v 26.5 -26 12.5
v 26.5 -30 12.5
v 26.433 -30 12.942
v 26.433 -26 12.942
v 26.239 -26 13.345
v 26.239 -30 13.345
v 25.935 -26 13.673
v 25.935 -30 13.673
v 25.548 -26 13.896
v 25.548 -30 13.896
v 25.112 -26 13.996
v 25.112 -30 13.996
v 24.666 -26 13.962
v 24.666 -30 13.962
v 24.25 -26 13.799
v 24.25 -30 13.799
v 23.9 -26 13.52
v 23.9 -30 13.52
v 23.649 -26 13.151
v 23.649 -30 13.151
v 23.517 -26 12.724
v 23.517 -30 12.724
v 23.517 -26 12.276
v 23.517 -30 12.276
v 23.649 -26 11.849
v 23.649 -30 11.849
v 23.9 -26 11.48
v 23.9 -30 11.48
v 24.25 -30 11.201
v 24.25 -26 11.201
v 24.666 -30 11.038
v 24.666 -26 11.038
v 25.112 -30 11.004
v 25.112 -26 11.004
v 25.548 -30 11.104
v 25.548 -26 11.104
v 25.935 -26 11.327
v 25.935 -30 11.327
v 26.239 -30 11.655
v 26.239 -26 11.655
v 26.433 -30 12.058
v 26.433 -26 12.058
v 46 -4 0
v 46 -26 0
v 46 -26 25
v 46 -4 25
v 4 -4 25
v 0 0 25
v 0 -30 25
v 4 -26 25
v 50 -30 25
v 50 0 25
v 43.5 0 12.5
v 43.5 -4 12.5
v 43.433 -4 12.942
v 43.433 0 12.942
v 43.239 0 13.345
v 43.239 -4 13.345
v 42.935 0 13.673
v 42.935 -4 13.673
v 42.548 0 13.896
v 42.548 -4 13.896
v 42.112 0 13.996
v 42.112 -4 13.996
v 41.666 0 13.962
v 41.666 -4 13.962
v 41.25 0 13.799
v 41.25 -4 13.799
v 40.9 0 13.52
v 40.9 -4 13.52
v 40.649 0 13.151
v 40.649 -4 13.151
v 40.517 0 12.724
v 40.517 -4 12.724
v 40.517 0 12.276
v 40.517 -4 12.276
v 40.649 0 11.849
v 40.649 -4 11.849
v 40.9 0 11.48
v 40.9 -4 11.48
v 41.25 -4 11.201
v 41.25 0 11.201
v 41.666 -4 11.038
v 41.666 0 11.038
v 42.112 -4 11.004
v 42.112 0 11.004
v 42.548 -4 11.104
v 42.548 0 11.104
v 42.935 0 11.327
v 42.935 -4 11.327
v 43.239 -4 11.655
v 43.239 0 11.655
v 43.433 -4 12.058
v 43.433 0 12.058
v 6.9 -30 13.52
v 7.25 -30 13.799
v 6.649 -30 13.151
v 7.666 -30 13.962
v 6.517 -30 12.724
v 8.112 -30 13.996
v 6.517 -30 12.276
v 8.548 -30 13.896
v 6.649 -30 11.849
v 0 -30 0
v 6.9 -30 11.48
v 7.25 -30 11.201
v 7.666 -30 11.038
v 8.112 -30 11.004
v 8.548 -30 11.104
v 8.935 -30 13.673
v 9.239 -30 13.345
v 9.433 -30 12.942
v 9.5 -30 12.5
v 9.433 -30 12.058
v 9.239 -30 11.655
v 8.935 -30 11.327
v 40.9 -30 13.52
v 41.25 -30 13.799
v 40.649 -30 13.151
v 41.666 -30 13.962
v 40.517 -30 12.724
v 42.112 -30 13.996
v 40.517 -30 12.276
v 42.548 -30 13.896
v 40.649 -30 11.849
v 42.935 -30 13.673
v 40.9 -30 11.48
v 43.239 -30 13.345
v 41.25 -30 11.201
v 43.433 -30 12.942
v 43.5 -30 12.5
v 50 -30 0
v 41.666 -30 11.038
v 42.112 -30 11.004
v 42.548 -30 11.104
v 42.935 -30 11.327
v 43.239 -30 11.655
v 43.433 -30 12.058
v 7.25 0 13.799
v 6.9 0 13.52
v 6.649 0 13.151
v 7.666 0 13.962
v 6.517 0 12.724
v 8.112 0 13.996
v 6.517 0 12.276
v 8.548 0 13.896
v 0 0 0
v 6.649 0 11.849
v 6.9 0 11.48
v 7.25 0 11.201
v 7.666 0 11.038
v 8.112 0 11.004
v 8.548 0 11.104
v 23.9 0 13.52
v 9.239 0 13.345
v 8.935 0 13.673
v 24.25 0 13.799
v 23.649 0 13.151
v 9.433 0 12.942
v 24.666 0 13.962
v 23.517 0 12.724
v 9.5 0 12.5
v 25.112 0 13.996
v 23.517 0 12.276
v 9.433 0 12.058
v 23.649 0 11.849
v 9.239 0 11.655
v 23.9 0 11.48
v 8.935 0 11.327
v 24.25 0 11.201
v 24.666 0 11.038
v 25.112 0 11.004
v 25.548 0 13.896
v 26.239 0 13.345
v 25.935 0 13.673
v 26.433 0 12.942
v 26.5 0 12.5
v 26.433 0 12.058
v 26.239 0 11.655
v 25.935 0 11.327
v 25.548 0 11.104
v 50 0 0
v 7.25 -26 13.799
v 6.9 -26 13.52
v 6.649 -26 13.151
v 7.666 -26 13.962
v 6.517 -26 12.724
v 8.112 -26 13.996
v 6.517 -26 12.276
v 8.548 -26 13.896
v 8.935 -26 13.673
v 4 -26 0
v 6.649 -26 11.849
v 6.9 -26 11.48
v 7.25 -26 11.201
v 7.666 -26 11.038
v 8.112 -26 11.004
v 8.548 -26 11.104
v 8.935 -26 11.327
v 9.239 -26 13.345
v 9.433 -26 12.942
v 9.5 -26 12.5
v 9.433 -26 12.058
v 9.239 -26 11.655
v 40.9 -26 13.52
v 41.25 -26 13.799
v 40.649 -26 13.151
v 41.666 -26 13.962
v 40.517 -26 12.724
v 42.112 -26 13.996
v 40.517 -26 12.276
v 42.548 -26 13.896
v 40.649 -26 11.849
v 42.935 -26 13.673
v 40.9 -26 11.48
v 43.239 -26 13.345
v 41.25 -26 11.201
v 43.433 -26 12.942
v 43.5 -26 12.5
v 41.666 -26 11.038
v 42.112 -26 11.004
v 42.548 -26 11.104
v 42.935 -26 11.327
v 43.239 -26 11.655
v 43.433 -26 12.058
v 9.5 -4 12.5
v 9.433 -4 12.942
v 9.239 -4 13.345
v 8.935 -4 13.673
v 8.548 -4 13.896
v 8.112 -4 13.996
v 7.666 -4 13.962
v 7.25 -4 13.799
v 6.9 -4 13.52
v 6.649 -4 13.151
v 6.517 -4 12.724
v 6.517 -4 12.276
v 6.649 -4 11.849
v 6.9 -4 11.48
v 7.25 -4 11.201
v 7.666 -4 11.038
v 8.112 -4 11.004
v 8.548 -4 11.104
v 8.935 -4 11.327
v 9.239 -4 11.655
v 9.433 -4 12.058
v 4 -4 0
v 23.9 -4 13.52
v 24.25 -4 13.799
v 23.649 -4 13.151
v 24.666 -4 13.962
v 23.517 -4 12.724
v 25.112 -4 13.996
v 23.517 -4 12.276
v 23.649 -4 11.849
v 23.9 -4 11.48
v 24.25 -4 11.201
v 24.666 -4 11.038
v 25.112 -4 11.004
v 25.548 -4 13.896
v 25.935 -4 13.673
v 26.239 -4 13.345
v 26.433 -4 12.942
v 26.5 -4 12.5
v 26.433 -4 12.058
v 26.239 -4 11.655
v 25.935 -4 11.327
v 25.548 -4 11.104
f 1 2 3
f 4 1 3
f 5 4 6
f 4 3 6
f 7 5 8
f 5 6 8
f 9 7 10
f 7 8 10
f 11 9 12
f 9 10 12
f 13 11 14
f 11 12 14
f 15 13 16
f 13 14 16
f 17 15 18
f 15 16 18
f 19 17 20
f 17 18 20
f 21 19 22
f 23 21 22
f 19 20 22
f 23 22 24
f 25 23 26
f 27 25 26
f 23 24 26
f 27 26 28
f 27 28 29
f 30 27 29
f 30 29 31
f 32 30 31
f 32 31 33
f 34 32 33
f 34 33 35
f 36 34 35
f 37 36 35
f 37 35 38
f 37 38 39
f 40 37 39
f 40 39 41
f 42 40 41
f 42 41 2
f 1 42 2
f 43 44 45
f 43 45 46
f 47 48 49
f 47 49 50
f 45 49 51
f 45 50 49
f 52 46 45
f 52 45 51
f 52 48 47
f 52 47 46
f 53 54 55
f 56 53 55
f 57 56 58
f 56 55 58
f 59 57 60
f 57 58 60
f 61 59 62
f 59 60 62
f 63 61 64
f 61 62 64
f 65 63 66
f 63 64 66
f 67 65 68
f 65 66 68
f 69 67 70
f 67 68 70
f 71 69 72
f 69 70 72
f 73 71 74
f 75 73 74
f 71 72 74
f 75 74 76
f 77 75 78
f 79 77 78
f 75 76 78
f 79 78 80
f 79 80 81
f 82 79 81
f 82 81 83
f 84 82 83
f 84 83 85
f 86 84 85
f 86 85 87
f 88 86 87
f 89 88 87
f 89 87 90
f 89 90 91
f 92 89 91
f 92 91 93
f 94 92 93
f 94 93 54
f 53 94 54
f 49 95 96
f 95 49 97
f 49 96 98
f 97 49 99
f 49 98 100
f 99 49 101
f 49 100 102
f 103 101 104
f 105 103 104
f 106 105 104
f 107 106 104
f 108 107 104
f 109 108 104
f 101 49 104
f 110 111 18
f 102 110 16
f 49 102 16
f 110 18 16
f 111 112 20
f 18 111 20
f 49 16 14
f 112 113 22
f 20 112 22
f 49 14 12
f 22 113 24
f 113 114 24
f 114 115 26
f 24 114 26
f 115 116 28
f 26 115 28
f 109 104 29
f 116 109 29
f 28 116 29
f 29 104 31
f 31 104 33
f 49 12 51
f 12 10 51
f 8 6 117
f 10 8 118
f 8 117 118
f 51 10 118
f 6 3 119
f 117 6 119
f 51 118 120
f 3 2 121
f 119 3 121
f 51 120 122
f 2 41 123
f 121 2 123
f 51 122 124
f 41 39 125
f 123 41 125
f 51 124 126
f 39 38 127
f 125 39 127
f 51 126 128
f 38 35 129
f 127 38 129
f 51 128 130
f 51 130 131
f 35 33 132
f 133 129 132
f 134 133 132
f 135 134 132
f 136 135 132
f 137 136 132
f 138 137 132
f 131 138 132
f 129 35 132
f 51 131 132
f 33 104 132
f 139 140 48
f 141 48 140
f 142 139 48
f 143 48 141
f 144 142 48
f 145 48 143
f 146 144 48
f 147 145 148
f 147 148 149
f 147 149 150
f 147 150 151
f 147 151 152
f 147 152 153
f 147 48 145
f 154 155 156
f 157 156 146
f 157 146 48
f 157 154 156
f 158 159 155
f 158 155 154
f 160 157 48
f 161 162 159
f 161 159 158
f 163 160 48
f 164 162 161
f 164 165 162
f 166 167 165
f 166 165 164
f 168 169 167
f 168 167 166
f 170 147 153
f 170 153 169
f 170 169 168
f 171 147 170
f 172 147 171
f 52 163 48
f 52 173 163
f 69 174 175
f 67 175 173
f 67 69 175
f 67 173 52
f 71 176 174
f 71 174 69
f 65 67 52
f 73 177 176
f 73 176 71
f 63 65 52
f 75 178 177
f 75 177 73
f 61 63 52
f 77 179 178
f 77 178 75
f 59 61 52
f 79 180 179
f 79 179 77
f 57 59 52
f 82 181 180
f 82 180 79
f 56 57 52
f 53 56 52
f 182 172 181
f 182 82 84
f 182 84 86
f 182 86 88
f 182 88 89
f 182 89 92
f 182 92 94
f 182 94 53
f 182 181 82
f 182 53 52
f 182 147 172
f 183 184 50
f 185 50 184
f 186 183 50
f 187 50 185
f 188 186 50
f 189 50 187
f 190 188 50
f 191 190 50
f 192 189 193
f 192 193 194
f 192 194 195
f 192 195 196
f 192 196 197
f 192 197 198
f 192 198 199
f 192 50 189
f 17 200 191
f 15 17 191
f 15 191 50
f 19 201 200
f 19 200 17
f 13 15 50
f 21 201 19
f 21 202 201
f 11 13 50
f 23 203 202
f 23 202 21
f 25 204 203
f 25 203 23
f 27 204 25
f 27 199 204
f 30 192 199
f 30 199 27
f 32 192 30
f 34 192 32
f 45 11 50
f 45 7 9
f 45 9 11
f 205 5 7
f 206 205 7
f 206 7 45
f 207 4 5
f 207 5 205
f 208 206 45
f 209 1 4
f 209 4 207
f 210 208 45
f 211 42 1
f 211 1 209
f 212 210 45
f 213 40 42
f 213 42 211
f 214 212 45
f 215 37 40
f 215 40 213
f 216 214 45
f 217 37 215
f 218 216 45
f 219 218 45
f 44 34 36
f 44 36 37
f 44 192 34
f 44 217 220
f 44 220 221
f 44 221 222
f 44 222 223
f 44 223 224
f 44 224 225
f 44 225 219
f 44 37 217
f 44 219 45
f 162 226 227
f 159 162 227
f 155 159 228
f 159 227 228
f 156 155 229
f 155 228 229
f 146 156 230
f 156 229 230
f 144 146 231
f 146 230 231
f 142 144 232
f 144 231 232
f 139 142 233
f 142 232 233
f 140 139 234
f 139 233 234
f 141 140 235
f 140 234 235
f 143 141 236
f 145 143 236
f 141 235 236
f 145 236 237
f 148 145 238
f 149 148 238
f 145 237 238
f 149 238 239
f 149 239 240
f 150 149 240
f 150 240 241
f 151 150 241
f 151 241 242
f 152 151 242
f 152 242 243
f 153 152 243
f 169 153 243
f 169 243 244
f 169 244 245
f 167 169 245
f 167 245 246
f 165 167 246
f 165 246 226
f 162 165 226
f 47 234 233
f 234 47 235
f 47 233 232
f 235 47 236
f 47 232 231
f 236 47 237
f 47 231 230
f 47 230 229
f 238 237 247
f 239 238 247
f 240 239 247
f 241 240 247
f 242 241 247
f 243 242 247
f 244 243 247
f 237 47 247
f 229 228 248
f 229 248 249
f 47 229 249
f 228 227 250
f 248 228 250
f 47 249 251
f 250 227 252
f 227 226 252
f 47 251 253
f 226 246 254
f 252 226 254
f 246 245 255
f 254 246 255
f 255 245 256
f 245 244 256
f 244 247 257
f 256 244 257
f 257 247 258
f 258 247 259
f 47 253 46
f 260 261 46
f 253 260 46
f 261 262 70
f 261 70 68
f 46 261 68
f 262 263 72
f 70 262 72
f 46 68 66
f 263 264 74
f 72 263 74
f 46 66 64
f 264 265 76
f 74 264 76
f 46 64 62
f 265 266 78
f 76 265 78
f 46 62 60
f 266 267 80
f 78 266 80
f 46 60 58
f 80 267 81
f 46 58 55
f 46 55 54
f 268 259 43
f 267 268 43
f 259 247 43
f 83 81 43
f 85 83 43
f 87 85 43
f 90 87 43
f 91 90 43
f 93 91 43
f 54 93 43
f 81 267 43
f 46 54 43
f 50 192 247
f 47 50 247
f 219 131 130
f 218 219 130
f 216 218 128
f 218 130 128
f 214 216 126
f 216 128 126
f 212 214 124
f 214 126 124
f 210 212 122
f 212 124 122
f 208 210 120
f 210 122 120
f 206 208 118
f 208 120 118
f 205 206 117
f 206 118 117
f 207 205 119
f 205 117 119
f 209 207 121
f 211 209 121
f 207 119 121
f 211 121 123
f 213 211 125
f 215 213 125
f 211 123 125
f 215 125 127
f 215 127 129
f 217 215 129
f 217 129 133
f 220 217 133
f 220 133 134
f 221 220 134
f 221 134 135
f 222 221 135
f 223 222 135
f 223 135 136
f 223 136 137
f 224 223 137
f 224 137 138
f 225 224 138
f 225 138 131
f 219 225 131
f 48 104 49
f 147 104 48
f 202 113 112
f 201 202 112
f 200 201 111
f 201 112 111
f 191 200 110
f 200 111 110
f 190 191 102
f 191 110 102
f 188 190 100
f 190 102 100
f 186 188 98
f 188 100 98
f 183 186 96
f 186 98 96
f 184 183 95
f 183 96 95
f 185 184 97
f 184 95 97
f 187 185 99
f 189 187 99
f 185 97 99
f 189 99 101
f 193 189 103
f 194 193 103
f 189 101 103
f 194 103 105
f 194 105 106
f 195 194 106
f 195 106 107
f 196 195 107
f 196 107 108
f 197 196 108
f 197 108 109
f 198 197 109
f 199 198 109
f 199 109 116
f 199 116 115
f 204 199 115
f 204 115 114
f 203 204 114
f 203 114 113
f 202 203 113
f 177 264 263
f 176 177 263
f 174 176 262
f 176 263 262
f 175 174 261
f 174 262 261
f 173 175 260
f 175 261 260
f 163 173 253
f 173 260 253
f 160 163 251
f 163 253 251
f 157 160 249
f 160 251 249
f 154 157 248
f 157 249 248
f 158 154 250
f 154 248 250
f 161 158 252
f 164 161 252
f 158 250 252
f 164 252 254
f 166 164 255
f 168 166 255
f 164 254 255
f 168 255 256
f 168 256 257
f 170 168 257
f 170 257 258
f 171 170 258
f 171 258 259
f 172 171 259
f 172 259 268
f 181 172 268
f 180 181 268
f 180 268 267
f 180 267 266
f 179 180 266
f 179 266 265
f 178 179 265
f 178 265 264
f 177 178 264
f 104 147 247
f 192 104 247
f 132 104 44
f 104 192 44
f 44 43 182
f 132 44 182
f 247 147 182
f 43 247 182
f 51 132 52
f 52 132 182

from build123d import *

# Parameters (mm, degrees)
F0_W     = 50
F0_H     = 30
F0_W_2   = 42
F0_H_2   = 22
F1_DEPTH = 25
F2_R     = 1.5
F3_DEPTH = 35


with BuildPart() as f1:
    # F0 (on Top) → F1 (new body)
    with BuildSketch(Plane.XY):
        with Locations((25, -15)):
            Rectangle(F0_W, F0_H)
        with Locations((25, -15)):
            Rectangle(F0_W_2, F0_H_2, mode=Mode.SUBTRACT)
    extrude(amount=F1_DEPTH)

    # F2 (on face) → F3 (cut)
    with BuildSketch(Plane.XZ.offset(30)):
        with Locations((25, 12.5)):
            Circle(F2_R)
        with Locations((8, 12.5)):
            Circle(F2_R)
        with Locations((42, 12.5)):
            Circle(F2_R)
    extrude(amount=-F3_DEPTH, mode=Mode.SUBTRACT)


solid = f1.part
